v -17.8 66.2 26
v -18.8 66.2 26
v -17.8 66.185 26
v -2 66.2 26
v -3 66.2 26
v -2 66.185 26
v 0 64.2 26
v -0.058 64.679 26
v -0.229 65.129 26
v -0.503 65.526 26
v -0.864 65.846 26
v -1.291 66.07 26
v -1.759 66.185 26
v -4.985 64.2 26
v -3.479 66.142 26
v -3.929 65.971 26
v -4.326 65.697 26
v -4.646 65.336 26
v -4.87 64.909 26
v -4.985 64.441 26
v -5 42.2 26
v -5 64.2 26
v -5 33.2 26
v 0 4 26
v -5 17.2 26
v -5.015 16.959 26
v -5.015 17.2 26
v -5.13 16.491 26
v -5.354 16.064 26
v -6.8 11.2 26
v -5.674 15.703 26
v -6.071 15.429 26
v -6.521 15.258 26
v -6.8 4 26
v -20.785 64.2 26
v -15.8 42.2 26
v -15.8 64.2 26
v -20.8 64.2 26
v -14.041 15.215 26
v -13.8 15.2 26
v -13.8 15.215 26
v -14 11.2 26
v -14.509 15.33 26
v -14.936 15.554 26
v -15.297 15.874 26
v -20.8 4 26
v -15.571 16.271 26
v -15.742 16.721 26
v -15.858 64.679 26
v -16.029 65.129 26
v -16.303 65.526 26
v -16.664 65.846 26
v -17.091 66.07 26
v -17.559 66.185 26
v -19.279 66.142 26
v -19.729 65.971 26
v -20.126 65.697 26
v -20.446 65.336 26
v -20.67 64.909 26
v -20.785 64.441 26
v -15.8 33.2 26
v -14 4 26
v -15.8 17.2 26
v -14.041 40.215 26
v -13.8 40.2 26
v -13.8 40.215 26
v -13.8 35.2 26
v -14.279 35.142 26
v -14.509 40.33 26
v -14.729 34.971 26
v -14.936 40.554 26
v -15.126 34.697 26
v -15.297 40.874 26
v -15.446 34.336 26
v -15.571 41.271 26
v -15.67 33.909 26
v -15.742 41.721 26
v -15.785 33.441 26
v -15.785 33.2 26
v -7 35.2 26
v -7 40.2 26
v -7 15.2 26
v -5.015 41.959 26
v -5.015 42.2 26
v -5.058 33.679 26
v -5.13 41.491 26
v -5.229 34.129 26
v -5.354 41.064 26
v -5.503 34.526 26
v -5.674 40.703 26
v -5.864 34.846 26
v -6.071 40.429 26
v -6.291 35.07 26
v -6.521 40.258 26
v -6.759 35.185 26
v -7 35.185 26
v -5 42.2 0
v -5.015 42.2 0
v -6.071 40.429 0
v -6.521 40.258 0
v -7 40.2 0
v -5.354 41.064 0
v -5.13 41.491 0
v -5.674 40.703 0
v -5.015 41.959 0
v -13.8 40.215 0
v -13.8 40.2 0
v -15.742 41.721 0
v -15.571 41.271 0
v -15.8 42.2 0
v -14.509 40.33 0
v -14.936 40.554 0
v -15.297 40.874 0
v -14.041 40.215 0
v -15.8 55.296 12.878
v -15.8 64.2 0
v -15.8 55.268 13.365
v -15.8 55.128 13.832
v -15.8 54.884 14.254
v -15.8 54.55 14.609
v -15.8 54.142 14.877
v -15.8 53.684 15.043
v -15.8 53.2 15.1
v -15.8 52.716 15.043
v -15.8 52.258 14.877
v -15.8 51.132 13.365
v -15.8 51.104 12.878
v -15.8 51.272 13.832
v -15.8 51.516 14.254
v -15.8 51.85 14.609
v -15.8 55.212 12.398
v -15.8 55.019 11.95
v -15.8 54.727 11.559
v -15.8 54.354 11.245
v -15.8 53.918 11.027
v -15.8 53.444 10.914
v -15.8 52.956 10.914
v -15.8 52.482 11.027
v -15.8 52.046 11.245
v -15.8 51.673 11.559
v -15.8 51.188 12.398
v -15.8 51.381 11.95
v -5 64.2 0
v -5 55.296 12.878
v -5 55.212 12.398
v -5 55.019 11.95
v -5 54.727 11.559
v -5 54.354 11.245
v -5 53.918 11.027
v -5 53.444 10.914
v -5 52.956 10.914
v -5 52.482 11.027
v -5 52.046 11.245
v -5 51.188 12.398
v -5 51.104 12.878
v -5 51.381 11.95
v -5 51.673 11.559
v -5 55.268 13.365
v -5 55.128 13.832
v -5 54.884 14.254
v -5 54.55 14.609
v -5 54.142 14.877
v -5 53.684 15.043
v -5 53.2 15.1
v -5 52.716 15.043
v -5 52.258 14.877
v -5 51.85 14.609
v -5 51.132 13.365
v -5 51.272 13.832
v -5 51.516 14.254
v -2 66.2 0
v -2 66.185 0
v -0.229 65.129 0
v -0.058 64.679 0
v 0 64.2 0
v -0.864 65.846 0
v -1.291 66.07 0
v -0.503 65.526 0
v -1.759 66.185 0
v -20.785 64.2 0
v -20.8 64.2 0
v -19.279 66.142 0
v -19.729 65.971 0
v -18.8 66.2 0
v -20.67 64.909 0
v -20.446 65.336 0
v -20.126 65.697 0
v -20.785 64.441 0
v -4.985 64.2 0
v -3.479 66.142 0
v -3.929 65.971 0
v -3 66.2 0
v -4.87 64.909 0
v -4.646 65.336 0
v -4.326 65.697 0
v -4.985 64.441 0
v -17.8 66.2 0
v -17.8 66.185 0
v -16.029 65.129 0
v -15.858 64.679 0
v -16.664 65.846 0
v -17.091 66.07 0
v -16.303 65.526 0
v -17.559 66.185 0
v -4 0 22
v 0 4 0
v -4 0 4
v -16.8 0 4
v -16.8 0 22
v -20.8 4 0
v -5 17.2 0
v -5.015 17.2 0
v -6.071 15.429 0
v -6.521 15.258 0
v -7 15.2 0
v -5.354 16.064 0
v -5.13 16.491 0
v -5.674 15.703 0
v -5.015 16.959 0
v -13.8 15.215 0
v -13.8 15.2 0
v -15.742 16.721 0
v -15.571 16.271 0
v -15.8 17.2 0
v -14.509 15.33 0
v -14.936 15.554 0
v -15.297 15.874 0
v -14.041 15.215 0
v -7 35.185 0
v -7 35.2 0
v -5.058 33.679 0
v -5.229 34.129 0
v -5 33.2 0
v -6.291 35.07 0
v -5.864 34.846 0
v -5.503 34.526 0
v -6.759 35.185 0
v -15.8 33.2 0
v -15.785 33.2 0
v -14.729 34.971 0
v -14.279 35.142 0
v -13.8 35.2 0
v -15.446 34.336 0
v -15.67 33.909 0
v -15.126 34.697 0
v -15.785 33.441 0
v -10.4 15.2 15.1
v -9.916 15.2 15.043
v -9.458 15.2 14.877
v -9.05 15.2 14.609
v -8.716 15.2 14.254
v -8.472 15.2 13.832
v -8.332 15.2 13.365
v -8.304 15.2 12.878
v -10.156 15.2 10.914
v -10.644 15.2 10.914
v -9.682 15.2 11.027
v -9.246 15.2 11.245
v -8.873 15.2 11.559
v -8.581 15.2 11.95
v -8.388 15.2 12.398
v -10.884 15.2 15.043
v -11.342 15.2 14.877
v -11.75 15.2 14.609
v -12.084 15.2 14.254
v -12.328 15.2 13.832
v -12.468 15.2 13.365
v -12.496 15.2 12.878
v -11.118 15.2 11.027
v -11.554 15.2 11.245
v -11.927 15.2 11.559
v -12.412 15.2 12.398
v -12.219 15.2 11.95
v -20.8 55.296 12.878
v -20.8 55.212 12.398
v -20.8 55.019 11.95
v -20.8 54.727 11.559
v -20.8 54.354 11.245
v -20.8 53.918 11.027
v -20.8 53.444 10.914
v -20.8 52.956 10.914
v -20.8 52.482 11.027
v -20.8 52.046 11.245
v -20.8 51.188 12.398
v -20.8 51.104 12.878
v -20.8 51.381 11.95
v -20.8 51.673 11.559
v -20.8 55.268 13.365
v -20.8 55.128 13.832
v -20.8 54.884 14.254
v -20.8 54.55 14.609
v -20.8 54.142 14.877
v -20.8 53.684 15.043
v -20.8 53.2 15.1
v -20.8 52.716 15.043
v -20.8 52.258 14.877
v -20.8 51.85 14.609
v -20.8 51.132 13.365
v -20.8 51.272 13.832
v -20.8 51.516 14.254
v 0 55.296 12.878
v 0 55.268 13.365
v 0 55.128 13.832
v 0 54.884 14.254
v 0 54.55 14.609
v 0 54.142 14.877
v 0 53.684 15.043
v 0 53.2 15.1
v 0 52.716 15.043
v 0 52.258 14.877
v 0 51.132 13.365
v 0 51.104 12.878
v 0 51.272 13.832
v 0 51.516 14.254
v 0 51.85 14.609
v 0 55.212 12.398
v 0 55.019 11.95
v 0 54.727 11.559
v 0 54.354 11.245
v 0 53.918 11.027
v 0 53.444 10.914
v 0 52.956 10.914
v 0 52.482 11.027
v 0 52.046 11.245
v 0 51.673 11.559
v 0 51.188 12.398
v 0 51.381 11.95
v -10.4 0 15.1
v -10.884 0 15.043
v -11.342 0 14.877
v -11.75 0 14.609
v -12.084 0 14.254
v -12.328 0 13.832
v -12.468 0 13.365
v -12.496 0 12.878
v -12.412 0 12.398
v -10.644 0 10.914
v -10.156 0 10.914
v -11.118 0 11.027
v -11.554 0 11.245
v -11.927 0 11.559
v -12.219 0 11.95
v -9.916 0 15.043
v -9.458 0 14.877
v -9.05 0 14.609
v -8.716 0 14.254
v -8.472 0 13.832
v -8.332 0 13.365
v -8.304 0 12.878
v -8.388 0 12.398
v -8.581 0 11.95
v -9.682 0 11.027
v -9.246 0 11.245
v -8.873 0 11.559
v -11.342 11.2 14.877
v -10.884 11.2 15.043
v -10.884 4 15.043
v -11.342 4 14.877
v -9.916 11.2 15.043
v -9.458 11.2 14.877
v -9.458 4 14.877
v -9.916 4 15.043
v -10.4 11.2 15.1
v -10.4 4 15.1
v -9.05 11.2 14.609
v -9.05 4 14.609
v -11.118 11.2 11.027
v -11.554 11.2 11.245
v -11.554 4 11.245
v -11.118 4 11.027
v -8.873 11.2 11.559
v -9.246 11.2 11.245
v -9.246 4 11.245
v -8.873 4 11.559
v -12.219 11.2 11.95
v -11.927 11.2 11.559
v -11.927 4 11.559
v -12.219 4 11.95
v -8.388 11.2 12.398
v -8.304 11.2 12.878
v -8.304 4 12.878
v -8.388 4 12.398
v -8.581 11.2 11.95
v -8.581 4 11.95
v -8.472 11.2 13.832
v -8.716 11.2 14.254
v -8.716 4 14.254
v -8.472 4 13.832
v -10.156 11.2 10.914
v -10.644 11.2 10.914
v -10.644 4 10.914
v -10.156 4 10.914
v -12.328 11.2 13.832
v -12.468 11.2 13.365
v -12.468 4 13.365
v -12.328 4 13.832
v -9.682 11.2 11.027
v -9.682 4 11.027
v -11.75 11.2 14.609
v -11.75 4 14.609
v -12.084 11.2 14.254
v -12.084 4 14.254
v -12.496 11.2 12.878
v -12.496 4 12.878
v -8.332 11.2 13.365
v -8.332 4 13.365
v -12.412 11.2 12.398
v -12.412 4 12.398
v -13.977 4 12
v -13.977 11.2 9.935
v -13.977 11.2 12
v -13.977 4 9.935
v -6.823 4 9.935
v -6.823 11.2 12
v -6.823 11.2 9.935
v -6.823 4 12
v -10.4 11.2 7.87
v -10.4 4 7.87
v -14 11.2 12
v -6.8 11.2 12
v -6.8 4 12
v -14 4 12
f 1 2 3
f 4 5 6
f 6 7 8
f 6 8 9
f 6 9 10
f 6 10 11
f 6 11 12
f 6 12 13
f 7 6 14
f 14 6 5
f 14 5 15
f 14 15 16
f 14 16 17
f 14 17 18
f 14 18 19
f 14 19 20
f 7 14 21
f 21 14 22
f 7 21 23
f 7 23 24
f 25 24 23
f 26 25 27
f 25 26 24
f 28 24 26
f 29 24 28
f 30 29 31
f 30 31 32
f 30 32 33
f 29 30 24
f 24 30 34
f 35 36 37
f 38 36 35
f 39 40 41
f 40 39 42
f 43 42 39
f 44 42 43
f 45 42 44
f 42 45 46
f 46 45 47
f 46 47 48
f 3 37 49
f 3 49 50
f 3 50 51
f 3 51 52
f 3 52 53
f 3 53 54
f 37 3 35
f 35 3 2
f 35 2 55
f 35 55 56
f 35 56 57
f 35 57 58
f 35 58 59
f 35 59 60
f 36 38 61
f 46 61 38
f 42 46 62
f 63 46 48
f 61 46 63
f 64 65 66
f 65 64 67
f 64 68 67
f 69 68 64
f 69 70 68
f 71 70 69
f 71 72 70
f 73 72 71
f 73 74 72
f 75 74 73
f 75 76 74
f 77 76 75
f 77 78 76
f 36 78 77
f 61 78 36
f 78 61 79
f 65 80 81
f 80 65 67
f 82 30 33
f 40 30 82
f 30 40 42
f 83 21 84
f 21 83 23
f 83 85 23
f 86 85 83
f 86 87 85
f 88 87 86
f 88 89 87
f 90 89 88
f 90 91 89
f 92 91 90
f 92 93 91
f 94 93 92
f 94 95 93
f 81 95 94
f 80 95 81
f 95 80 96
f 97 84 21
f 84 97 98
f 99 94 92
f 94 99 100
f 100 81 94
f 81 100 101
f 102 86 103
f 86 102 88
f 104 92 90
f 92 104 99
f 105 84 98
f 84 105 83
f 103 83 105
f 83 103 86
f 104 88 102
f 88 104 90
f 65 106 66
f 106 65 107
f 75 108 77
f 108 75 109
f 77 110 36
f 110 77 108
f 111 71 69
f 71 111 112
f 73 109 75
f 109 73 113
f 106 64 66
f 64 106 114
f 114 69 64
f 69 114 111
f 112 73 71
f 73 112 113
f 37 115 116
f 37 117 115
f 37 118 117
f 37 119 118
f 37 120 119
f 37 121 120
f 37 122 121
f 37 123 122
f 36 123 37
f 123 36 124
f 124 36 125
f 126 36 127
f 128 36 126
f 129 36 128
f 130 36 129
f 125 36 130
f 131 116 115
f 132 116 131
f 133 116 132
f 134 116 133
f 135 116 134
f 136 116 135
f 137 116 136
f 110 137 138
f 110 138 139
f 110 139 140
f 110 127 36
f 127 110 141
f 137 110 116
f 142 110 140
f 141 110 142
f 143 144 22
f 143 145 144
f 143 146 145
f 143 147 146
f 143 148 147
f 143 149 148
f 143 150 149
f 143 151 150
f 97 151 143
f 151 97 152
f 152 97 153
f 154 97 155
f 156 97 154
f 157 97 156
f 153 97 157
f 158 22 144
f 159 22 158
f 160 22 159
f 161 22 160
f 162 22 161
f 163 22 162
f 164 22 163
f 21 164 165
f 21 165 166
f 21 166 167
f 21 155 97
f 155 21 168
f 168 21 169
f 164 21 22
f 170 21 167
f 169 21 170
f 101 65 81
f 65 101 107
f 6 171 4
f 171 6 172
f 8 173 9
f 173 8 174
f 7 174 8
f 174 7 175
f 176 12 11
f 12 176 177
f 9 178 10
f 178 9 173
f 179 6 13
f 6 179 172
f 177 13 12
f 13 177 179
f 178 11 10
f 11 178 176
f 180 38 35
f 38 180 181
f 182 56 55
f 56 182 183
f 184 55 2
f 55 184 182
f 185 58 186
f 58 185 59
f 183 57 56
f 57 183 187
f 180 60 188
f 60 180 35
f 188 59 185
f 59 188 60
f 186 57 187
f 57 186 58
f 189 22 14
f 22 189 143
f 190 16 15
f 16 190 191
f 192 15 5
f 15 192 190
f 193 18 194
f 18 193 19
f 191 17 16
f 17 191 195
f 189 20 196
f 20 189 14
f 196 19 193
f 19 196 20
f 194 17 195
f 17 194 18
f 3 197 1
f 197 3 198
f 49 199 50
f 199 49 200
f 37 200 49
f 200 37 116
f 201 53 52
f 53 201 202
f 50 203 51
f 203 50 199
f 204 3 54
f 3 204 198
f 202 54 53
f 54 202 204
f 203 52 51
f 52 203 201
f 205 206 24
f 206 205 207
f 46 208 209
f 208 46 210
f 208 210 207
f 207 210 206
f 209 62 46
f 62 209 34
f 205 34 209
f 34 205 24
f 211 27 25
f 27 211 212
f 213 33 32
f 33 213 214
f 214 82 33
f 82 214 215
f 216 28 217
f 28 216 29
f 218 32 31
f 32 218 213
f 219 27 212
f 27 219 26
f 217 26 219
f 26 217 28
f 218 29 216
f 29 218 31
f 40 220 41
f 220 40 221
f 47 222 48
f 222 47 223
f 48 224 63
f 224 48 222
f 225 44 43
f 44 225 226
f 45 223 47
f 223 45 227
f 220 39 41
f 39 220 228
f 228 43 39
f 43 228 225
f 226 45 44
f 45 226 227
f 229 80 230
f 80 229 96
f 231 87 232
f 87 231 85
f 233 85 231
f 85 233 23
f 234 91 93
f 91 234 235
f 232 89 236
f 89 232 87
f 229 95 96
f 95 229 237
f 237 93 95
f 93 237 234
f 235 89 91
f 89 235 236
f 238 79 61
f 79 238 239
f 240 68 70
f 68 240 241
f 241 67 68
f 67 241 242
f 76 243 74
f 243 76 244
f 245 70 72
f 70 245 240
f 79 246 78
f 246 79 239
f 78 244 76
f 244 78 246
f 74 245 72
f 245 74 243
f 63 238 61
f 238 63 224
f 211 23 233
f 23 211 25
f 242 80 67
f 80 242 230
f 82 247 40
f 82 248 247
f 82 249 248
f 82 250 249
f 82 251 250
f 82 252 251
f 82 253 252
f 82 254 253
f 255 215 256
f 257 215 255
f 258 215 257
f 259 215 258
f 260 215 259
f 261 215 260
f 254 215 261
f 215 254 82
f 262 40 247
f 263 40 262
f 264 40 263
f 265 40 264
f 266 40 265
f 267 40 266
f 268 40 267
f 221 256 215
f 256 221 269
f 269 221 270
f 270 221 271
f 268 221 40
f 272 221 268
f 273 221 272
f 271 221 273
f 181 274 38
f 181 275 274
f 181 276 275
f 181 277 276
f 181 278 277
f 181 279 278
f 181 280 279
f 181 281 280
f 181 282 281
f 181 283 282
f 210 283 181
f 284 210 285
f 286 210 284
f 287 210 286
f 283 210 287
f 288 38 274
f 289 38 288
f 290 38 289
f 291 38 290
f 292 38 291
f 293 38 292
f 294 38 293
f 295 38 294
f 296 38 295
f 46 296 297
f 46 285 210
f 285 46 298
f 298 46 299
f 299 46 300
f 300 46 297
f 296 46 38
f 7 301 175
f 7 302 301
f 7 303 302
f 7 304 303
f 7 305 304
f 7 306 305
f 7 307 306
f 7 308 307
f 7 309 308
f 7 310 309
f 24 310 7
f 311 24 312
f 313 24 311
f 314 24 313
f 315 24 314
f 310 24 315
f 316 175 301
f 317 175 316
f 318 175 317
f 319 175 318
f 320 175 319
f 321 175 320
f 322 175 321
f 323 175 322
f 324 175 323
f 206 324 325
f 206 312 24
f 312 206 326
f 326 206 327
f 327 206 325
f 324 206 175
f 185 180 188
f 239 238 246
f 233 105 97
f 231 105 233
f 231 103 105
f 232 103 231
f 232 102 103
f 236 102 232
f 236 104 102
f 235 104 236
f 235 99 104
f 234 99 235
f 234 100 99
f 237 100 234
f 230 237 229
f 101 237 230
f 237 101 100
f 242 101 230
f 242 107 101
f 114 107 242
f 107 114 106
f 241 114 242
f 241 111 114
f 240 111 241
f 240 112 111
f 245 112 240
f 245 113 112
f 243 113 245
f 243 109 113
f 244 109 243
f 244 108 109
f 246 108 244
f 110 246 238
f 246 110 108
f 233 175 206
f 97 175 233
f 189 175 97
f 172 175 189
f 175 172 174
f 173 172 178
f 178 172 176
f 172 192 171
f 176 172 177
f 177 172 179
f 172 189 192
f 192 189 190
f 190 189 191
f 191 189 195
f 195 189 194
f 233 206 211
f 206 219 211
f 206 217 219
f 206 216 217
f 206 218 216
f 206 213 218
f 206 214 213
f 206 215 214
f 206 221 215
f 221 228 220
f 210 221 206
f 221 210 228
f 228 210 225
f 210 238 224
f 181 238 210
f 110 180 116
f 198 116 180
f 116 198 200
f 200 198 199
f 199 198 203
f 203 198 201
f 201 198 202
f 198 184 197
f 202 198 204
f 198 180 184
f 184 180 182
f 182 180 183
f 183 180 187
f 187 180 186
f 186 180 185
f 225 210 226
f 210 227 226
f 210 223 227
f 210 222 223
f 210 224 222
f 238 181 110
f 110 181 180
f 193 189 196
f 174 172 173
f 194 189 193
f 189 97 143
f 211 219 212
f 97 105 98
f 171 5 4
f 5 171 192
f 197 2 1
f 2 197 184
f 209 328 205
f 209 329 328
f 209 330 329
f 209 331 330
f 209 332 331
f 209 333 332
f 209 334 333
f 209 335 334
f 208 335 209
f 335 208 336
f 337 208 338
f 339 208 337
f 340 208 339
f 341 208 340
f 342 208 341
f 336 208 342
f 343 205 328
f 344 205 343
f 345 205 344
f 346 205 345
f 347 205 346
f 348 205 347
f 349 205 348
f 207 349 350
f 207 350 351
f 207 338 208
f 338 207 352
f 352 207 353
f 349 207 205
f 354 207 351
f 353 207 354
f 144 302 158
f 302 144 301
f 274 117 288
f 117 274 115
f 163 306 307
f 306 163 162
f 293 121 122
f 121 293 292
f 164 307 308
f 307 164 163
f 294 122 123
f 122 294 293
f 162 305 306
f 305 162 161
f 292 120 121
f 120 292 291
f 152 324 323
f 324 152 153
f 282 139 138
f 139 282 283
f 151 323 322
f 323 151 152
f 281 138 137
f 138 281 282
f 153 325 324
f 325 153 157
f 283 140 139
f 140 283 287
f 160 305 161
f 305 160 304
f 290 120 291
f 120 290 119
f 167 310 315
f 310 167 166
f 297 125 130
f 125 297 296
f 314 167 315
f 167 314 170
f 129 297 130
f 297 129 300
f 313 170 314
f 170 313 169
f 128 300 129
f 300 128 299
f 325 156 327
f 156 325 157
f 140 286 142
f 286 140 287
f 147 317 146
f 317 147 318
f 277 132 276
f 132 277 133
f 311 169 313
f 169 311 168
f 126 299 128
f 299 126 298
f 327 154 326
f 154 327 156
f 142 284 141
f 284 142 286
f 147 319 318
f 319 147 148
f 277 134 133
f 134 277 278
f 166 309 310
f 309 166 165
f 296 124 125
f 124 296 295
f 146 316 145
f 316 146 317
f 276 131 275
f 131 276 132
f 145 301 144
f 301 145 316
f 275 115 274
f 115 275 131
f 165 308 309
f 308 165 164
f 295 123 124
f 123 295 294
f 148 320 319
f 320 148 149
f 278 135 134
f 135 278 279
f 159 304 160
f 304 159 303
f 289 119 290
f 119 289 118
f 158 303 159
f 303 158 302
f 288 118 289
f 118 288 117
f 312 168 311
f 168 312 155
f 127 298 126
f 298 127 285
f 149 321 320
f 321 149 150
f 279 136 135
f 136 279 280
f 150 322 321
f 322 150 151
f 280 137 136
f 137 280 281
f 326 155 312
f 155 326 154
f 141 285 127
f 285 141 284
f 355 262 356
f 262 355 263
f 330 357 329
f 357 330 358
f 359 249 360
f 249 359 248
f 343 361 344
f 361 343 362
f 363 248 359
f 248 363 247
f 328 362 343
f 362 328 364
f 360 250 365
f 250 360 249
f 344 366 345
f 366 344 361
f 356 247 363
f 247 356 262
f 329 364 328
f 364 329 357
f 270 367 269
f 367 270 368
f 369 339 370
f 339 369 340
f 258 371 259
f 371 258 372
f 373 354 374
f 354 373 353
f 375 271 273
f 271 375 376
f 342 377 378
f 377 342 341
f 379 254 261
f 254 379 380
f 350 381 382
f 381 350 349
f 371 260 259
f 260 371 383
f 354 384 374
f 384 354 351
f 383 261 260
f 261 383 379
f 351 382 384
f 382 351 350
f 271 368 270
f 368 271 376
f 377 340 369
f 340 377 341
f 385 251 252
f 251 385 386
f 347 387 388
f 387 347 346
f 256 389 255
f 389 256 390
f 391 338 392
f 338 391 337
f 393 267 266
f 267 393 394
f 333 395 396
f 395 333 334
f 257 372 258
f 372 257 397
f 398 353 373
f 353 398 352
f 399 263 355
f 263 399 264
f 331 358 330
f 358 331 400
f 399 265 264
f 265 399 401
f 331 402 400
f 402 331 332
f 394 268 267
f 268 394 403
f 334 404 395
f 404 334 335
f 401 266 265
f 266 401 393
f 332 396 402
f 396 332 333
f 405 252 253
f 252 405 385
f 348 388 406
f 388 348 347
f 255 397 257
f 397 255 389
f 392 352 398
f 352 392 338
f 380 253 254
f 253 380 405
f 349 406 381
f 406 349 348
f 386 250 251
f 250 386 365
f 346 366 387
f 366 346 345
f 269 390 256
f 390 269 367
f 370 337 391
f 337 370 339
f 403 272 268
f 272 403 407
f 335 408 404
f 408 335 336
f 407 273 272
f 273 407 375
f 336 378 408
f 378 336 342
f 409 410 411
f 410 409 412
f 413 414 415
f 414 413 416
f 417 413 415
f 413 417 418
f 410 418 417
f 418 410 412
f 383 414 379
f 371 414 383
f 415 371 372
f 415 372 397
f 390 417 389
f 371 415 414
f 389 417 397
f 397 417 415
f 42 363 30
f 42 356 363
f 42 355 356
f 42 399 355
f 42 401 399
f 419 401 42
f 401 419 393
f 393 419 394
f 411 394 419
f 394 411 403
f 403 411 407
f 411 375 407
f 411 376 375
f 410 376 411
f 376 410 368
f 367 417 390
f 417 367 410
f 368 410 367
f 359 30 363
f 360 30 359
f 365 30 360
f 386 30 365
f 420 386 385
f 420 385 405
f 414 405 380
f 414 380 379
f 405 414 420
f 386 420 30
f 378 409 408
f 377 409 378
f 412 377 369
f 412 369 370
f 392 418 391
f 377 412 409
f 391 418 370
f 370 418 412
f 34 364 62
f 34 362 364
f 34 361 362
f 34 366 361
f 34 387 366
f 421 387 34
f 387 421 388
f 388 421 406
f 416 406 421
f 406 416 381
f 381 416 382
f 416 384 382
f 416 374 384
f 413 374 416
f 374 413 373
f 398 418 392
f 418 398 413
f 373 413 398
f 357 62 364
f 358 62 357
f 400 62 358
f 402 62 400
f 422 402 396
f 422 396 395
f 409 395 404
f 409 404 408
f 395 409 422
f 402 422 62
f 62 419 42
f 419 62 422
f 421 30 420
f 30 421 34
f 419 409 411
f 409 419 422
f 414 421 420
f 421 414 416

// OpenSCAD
// file: idler_cte.scad
include <oscad_utils/bolt_sizes.scad> // include to use the constants
use <oscad_utils/bolts.scad>  


// Height of the idler pulley group:
// - washer M6 DIN-9021
// - washer M4 DIN-125
// - bearing 624ZZ
// - washer M4 DIN-125
// - washer M6 DIN-9021
idler_h     = 10.8;  // no need for tolerance
//radius of the idler pulley 6mm DIN 9021 washer, the wider ones)
idler_r     = m6_wash9021_or + 2;  // or: outer radius
idler_r_xtr = idler_r + 2;  // +2: a little bit larger

// Thickness of the sides that holds the idler pulley
wall_thick = 5;


//  Length of the body, the stroke. Not including the pulley
tens_stroke = 20;

// distance between the pulley and the stroke
pulley_stroke_dist = wall_thick;

// plastic space above and bellow the nut for the screw
nut_holder_thick = 4;
// the space for the nut height, will be get multipliying this multiplier by
// the nut height 
nut_space_h_mult = 2;
nut_space = nut_space_h_mult * m4_nut_h_tol;
nut_holder_total = nut_space + 2*nut_holder_thick;

// inner fillet:
in_fillet = 2;

tens_h = idler_h + 2*wall_thick;
// old tensioner y
tens_l = (   nut_holder_total
          + tens_stroke
          + 2 * idler_r_xtr
          + pulley_stroke_dist) ;
tens_w = 2 * idler_r_xtr; 

tens_w_tol = tens_w + tol;
tens_h_tol = tens_h + tol;


// the shank for the idler pulley, 
boltidler_r_tol = m4_r_tol;
// the screw for tensioning the pulley 
bolttens_r_tol = m4_r_tol;

//aluprof_bolt_head_r_tol = m3_head_r_tol;
//aluprof_bolt_r_tol = m3_r_tol;
//aluprof_bolt_head_l = m3_head_l;
// bolt size to attach the piece to the aluminum profile
aluprof_bolt_d = 4;

// cannot do it with if due to the variable scope
aluprof_bolt_head_r_tol = (aluprof_bolt_d == 6) ?
                            m6_head_r_tol :
                          ((aluprof_bolt_d == 5) ?
                            m5_head_r_tol :
                          ((aluprof_bolt_d == 4) ?
                            m4_head_r_tol : m3_head_r_tol ));

// cannot do it with if due to the variable scope
aluprof_bolt_r_tol = (aluprof_bolt_d == 6) ?
                            m6_r_tol :
                          ((aluprof_bolt_d == 5) ?
                            m5_r_tol :
                          ((aluprof_bolt_d == 4) ?
                            m4_r_tol : m3_r_tol ));

// cannot do it with if due to the variable scope
aluprof_bolt_head_l = (aluprof_bolt_d == 6) ?
                            m6_head_l :
                          ((aluprof_bolt_d == 5) ?
                            m5_head_l :
                          ((aluprof_bolt_d == 4) ?
                            m4_head_l : m3_head_l ));

/* this is useless in openscad because of the variable scope
   the variables are not updated after the conditions
if (aluprof_bolt_d == 6) {
  aluprof_bolt_head_r_tol = m6_head_r_tol;
  aluprof_bolt_r_tol = m6_r_tol;
  aluprof_bolt_head_l = m6_head_l;
} else {
  if (aluprof_bolt_d == 5) {
    aluprof_bolt_head_r_tol = m5_head_r_tol;
    aluprof_bolt_r_tol = m5_r_tol;
    aluprof_bolt_head_l = m5_head_l;
    echo(aluprof_bolt_r_tol);
  } else {
    if (aluprof_bolt_d == 4) {
      aluprof_bolt_head_r_tol = m4_head_r_tol;
      aluprof_bolt_r_tol = m4_r_tol;
      aluprof_bolt_head_l = m4_head_l;
    } else {
      aluprof_bolt_head_r_tol = m3_head_r_tol;
      aluprof_bolt_r_tol = m3_r_tol;
      aluprof_bolt_head_l = m3_head_l;
    }
  }
}
*/


// We are using 30x30 profiles
aluprof_w = 30;

// The position where the GT2 starts, from the lower profile
// Considering that the filter holder and guide are in a higher
// aluminum profile than the filter_idler

gt2_pos_h = aluprof_w + 3.5;

tens_pos_h = gt2_pos_h - wall_thick;

// The part of the tensioner that will be inside
tens_l_inside = tens_l - 2 * idler_r_xtr;

// the height to the beggining of the pulley + pulley height +
//  

hold_w = tens_w + 2*wall_thick;
hold_l = tens_l_inside + wall_thick;
hold_h = tens_pos_h + tens_h + wall_thick;

hold_bas_w = hold_w + 2*aluprof_w;
hold_bas_l = aluprof_w;
hold_bas_h = 8;

// optional tensioner chamfer, see step 04b in idler_tensioner.scad
opt_tens_chmf = 1;
// if you want to have the hole at the idler_holder to see inside, on one
// side, or both sides:
hold_hole_2sides = 1;
// file: oscad_utils/bolts.scad
/*
 *    OpenScad functions to make bolt holes
 *
 *    Copyright (C) 2016 Felipe Machado
 *    Universidad Rey Juan Carlos, Spain
 *    https://github.com/felipe-m
 *    License: LGPL 3.0 or later
 *
 *    to use this functions include in your file:
 * use <bolts.scad>
 *    if not in the same directory:
 * use <PATH_TO/bolts.scad>
 *    dont use 'include' instead of 'use' so you dont get the objects
 *    created in this file
*/


include <bolt_sizes.scad>

// the hole for the bolt shank and the nut
// Tolerances have to be included
// r_shank: Radius of the shank (tolerance included)
// l_bolt: total length of the bolt: head & shank
// r_head: radius of the head (tolerance included)
// l_head: length of the head
// hex_head: inidicates if the head is hexagonal or rounded
//            1: hexagonal
//            0: rounded
// h_layer3d: height of the layer for printing, if 0, means that the support
//            is not needed
// mnfold: 1 if you want 1 mm on top and botton to avoid non-manifold
//             pieces after makeing differences


module bolt_hole (r_shank, l_bolt, r_head, l_head, hex_head, h_layer3d, mnfold)
{
  union () {
    // we make it all the way, although it is not necessary because
    // on the lower part it will be also the nut 
    // if mnfold == 1 it will make the translations and make the piece 
    // larger
    translate([0,0,-mnfold])
      cylinder (r= r_shank, h= l_bolt+2*mnfold, $fa=1, $fs=0.5);
   if (hex_head == 0) {
      translate([0,0,-mnfold])
        cylinder (r= r_head, h= l_head+mnfold, $fa=1, $fs=0.5);  
   } else {
      translate([0,0,-mnfold])
      cylinder (r= r_head, h= l_head+mnfold, $fn=6);  
   }
    
  // This is a triangle that it is barely supported by the bolt head
  // and it will support the circle above 
  // In a regular triangle the apotheme (in radius) is twice
  // the circumradius (r)
  // Intersection with the hexagon to take the vertexs away, because
  // they are outside the hexagon
  if ( h_layer3d > 0) { // we don't do this if h_layer3d == 0
    intersection () {  
      rotate([0,0,30])translate([0,0,l_head])
        cylinder (r= r_shank*2, h=h_layer3d, $fn=3);
      // take vetexs away:
      if (hex_head == 0) {
        translate([0,0,l_head])
          cylinder (r= r_head, h= h_layer3d, $fa=1, $fs=0.5);       
      } else {
        translate([0,0,l_head])
          cylinder (r= r_head, h= h_layer3d, $fn=6);           
      }
    }
        // 1.15 is the relationship between the Radius and the Apothem
    // of the hexagon: sqrt(3)/2 . I make it slightly smaller
    translate([0,0,l_head+h_layer3d])
      //rotate ([0,0,30])
      cylinder (r=r_shank*1.15, h=h_layer3d, $fn=6);  
  
  }
 
 }  
  
}



bolt_hole (r_shank= m4_r_tol, l_bolt=10, r_head=m4_head_r_tol, l_head=m4_head_l, h_layer3d);


bolt_hole (r_shank = m4_r_tol, l_bolt=10, r_head=m4_head_r_tol, l_head=m4_head_l, hex_head=1, h_layer3d=h_layer3d, mnfold=1);

translate ([10,0,0])
#bolt_hole (r_shank = m4_r_tol, l_bolt=10, r_head=m4_head_r_tol, l_head=m4_head_l, hex_head=0, h_layer3d=h_layer3d, mnfold=0);
// file: oscad_utils/bolt_sizes.scad
/*
 *    OpenScad constants for bolt
 *
 *    Copyright (C) 2016 Felipe Machado
 *    Universidad Rey Juan Carlos, Spain
 *    https://github.com/felipe-m
 *    License: LGPL 3.0 or later
 *
 *    to use this functions include in your file:
 * include <bolts.scad>
 *    if not in the same directory:
 * include <PATH_TO/bolts.scad>
*/


// Tolerance
tol =  0.4;
// Tolerance for small objects
stol = 0.2;

h_layer3d = 0.3;
$fa=1;
$fs=0.5;

// Nuts and bolt sizes
m3_r = 1.5;  
m4_r = 2;    
m5_r = 2.5;  

// Tolerances stol/2 because is the radius
m3_r_tol = m3_r + stol/2;  // M3 diameter 3.2 mm for the tolerance
m4_r_tol = m4_r + stol/2;  // M4 diameter 4.2 mm for the tolerance
m5_r_tol = m5_r + (tol + stol)/4;  // M5 diameter 5.3 mm for the tolerance
//echo ("m3_r_tol", m3_r_tol);
//echo ("m4_r_tol", m4_r_tol);

// -------------- Head sizes DIN-912 bolts
// Head radius DIN-912 bolts
m3_head_r  = 5.5/2;
m4_head_r  = 7/2;
m5_head_r  = 8.5/2;
m6_head_r  = 10/2;
m8_head_r  = 13/2;
m10_head_r = 16/2;

// Head radius DIN-912 bolts with tolerances. 
// divided by 2 because is the radius
m3_head_r_tol  = m3_head_r  + tol/2;
m4_head_r_tol  = m4_head_r  + tol/2;
m5_head_r_tol  = m5_head_r  + tol/2;
m6_head_r_tol  = m6_head_r  + tol/2;
m8_head_r_tol  = m8_head_r  + tol/2;
m10_head_r_tol = m10_head_r + tol/2;

// Head length DIN-912 bolts
m3_head_l = 3;
m4_head_l = 4;
m5_head_l = 4;
m6_head_l = 6;
m8_head_l = 8;

// M3 nut
m3_nut_r = 6.01/2;  // DIN934 M3 nut circumradius
m3_nut_h = 2.4;     // DIN934 M3 nut height

//less tolerance for small numbers. 0.2 (diameter)
m3_nut_r_tol = m3_nut_r + stol/2;  //radius: diam/2
m3_nut_h_tol = m3_nut_h + tol;

// M4 nut
m4_nut_r = 7.66/2;  // DIN934 M4 nut circumradius
m4_nut_h = 3.2;     // DIN934 M4 nut height
m4_nut_ap = 7/2;    // DIN934 M4 nut apotheme

//less tolerance for small numbers. 0.2 (diameter)
m4_nut_r_tol  = m4_nut_r + stol/2;  //radius: diam/2
m4_nut_h_tol  = m4_nut_h + tol;
m4_nut_ap_tol = m4_nut_ap + stol/2; 

// -------------------- DIN 9021 Washers ----------------
// outer radius (or)
m6_wash9021_or = 18 / 2;
// height
m6_wash9021_h = 1.6;
// main file
/* Idler pulley tensioner
  ----------------------------------------------------------------------------
  -- (c) Felipe Machado
  -- Area of Electronic Technology. Rey Juan Carlos University (urjc.es)
  -- https://github.com/felipe-m
  -- December-2017
  ----------------------------------------------------------------------------
  --- LGPL Licence
  ----------------------------------------------------------------------------


           Z
           :              ........ tens_l ........
           :             :                        :
         .. ________       _______________________
         : |___::___|     /      ______   ___::___|
         : |    ....|    |  __  |      | |
  tens_h + |   ()...|    |:|  |:|      | |         
         : |________|    |  --  |______| |________
         :.|___::___|     \__________________::___|.......> Y


            ________ ....> X
           |___::___|
           |  ......|
           |  :.....|
           |   ::   |
           |........|
           |        |
           |        |
           |........|
           |........|
           |        |
           |   ()   |
           |        |
           |________|
           :        :
           :........:
               +
              tens_w
*/


include <oscad_utils/bolt_sizes.scad> // include to use the constants
use <oscad_utils/fillet.scad>
use <oscad_utils/bolts.scad>  
// where the constants are defined
include <idler_cte.scad>

module idler_tens ()
{


  difference () {
    /* --------------- step 01 ---------------------------      
       rectangular cuboid with basic dimensions
      
                Z
                :.....tens_l.......
                :_________________:
                /                /|
               /                / |
            ../________________/  |..............Y     .
           :  |                |  /     . 
      tens_h  |                | /     . tens_w
            :.|________________|/......
             .
            .
           X 
    */
    cube([tens_w, tens_l, tens_h]);

    /* --------------- step 02 ---------------------------  
      Space for the idler pulley

           Z
           :
           :_______________________
           |                 ______|....
           |              f2/          + idler_h
           |               |           :
           |              f1\______....:
           |_______________________|...wall_thick.......> Y
                           :       :
                           :.......:
                              +
                            2 * idler_r_xtr
    */
    translate ([-1, tens_l - 2*idler_r_xtr, wall_thick])
    {
      difference () {
        // y+1: outer side of Y, to avoid manifold
        // z+2: 2 sides of Z to avoid manifold 
        cube([tens_w+2, 2 * idler_r_xtr +1, idler_h]);
        // fillet f1
        fillet_dif_x (r=in_fillet, h=tens_w,
                      ydir=-1, zdir=-1, fillet=1);
        // fillet f2
        translate ([0,0,idler_h])
          fillet_dif_x (r=in_fillet, h=tens_w,
                        ydir=-1, zdir=1, fillet=1);
      }
    }  
    /* --------------- step 03 --------------------------- 
      Fillets at the idler end:

           Z
           :
           :_______________________f2
           |                 ______|
           |                /      f4
           |               |
           |                \______f3...
           |_______________________|....+ wall_thick.....> Y
           :                       f1
           :...... tens_l .........:
    */
    // fillet at the bottom f1
    translate ([0,tens_l,0])
      fillet_dif_x (r=in_fillet, h=tens_w,
                    ydir=1, zdir=-1, fillet=1);
    // fillet on top: f2
    translate ([0,tens_l,tens_h])
      fillet_dif_x (r=in_fillet, h=tens_w,
                    ydir=1, zdir=1, fillet=1);
    // fillet at the bottom, inner side: f3
    translate ([0,tens_l,wall_thick])
      fillet_dif_x (r=in_fillet, h=tens_w,
                    ydir=1, zdir=1, fillet=1);
    // fillet on top, inner side: f4
    translate ([0,tens_l,tens_h - wall_thick])
      fillet_dif_x (r=in_fillet, h=tens_w,
                    ydir=1, zdir=-1, fillet=1);

    /* --------------- step 04 --------------------------- 
      Chamfers at the nut end:

           Z
           :
           : ______________________
         ch2/                ______|
           |                /             
           |               |        
           |                \______
         ch1\______________________|.............> Y
           :                       :
           :...... tens_l .........:
    */
    // chamfer 1
    fillet_dif_x (r=2*in_fillet, h=tens_w,
                  ydir=-1, zdir=-1, fillet=0);                    
    // chamfer 2
    translate ([0,0,tens_h])
      fillet_dif_x (r=2*in_fillet, h=tens_w,
                    ydir=-1, zdir=1, fillet=0); 

   /* --------------- step 04b OPTIONAL---------------------- 
      Chamfers at the nut end on axis Z, they are 45 degrees
      so they should print ok without support, but you may
      not want to have them

            ________ ....> X
        ch1/________\ch2
           |        |
           |        |
           |        |
           |        |
           |        |
           |        |
           |........|
           |        |
           |        |
           |        |
           |________|
           :
           Y
           
    */

    if (opt_tens_chmf == 1) { // optional tensioner chamfer
      fillet_dif_z (r=2*in_fillet, h=tens_h,
                    xdir=-1, ydir=-1, fillet=0);   
      translate([tens_w,0,0])
        fillet_dif_z (r=2*in_fillet, h=tens_h,
                       xdir=1, ydir=-1, fillet=0);
    }

    /* --------------- step 05 --------------------------- 
      Shank hole for the idler pulley:

           Z                     idler_r_xtr
           :                    .+..
           : ___________________:__:
            /                __:_:_|
           |                /             
           |               |        
           |                \______
            \__________________:_:_|.............> Y
           :                       :
           :...... tens_l .........:
    */                    
    translate ([tens_w/2., tens_l - idler_r_xtr, -1])
        cylinder (r=boltidler_r_tol, h= tens_w +2, $fa=1, $fs=0.5);

    /* --------------- step 06 --------------------------- 
      Hole for the leadscrew (stroke):

           Z
           :
           : ______________________
            /      _____     __:_:_|
           |    f2/     \f4 /             
           |     |       | |        
           |    f1\_____/f3 \______
            \__________________:_:_|.............> Y
           :     :       :         :
           :     :.......:         :
           :     :   +             :
           :.....:  tens_stroke    :
           :  +                    :
           : nut_holder_total      :
           :                       :
           :...... tens_l .........:
    */

    // Space for screw (the stroke)
    translate ([-1, nut_holder_total,wall_thick])
    {
      difference () {
        // tens_w+2: 2 sides of X to avoid manifold 
        cube([tens_w+2, tens_stroke, idler_h]);

        // fillet f1
        fillet_dif_x (r=in_fillet, h=tens_w,
                      ydir=-1, zdir=-1, fillet=1);
        // fillet f2
        translate ([0,0,idler_h])
          fillet_dif_x (r=in_fillet, h=tens_w,
                        ydir=-1, zdir=1, fillet=1);

        // fillet f3
        translate ([0,tens_stroke,0])
          fillet_dif_x (r=in_fillet, h=tens_w,
                        ydir=1, zdir=-1, fillet=1);

        // fillet f4
        translate ([0,tens_stroke,idler_h])
          fillet_dif_x (r=in_fillet, h=tens_w,
                        ydir=1, zdir=1, fillet=1);
      
      }  
    }
    
    /* --------------- step 07 --------------------------- 
      Hole for the leadscrew shank at the beginning

           Z
           :
           : ______________________
            /      _____     __:_:_|
           |      /     \   /
           |:::::|       | |
           |      \_____/   \______
            \__________________:_:_|.............> Y
           :     :                 :
           :     :                 :
           :     :                 :
           :.....:                 :
           :  +                    :
           : nut_holder_total      :
           :                       :
           :...... tens_l .........:
    */                      
      translate ([tens_w/2, -1, tens_h/2])
        rotate ([-90,0,0])
          cylinder (r=bolttens_r_tol, h= nut_holder_total +2, $fa=1, $fs=0.5);

    /* --------------- step 08 --------------------------- 
      Hole for the leadscrew nut

           Z
           :
           : ______________________
            /      _____     __:_:_|
           |  _   /     \   /
           |:|_|:|       | |
           |      \_____/   \______
            \__________________:_:_|.............> Y
           : :   :                 :
           :+    :                 :
           :nut_holder_thick       :
           :.....:                 :
           :  +                    :
           : nut_holder_total      :
           :                       :
           :...... tens_l .........:
    */                      

    // Hole for the leadscrew nut
    // tens_w/2-1 to have more tolerance, so it is a little bit deeper
    translate ([tens_w/2-1, nut_holder_thick, tens_h/2])
      //rotate ([0,90,0])
        rotate([-90,0,0]) //-90 to go to the positive side of Y
          // +stol to make it bigger. This is a hexagon for the nut,
          // not a cylinder: fn=6
          cylinder (r=m4_nut_r_tol+stol, h = nut_space, $fn=6);
   
    // Hole to insert the leadscrew nut
    // tens_h/2-1 to haver more tolerance
    translate ([tens_w/2-1, nut_holder_thick, tens_h/2-m4_nut_ap_tol])
      cube([tens_w/2 + 2,, nut_space, 2*m4_nut_ap_tol]);
  }
}

// rotate to print without support:
rotate([0,-90,0])
  idler_tens();
 
